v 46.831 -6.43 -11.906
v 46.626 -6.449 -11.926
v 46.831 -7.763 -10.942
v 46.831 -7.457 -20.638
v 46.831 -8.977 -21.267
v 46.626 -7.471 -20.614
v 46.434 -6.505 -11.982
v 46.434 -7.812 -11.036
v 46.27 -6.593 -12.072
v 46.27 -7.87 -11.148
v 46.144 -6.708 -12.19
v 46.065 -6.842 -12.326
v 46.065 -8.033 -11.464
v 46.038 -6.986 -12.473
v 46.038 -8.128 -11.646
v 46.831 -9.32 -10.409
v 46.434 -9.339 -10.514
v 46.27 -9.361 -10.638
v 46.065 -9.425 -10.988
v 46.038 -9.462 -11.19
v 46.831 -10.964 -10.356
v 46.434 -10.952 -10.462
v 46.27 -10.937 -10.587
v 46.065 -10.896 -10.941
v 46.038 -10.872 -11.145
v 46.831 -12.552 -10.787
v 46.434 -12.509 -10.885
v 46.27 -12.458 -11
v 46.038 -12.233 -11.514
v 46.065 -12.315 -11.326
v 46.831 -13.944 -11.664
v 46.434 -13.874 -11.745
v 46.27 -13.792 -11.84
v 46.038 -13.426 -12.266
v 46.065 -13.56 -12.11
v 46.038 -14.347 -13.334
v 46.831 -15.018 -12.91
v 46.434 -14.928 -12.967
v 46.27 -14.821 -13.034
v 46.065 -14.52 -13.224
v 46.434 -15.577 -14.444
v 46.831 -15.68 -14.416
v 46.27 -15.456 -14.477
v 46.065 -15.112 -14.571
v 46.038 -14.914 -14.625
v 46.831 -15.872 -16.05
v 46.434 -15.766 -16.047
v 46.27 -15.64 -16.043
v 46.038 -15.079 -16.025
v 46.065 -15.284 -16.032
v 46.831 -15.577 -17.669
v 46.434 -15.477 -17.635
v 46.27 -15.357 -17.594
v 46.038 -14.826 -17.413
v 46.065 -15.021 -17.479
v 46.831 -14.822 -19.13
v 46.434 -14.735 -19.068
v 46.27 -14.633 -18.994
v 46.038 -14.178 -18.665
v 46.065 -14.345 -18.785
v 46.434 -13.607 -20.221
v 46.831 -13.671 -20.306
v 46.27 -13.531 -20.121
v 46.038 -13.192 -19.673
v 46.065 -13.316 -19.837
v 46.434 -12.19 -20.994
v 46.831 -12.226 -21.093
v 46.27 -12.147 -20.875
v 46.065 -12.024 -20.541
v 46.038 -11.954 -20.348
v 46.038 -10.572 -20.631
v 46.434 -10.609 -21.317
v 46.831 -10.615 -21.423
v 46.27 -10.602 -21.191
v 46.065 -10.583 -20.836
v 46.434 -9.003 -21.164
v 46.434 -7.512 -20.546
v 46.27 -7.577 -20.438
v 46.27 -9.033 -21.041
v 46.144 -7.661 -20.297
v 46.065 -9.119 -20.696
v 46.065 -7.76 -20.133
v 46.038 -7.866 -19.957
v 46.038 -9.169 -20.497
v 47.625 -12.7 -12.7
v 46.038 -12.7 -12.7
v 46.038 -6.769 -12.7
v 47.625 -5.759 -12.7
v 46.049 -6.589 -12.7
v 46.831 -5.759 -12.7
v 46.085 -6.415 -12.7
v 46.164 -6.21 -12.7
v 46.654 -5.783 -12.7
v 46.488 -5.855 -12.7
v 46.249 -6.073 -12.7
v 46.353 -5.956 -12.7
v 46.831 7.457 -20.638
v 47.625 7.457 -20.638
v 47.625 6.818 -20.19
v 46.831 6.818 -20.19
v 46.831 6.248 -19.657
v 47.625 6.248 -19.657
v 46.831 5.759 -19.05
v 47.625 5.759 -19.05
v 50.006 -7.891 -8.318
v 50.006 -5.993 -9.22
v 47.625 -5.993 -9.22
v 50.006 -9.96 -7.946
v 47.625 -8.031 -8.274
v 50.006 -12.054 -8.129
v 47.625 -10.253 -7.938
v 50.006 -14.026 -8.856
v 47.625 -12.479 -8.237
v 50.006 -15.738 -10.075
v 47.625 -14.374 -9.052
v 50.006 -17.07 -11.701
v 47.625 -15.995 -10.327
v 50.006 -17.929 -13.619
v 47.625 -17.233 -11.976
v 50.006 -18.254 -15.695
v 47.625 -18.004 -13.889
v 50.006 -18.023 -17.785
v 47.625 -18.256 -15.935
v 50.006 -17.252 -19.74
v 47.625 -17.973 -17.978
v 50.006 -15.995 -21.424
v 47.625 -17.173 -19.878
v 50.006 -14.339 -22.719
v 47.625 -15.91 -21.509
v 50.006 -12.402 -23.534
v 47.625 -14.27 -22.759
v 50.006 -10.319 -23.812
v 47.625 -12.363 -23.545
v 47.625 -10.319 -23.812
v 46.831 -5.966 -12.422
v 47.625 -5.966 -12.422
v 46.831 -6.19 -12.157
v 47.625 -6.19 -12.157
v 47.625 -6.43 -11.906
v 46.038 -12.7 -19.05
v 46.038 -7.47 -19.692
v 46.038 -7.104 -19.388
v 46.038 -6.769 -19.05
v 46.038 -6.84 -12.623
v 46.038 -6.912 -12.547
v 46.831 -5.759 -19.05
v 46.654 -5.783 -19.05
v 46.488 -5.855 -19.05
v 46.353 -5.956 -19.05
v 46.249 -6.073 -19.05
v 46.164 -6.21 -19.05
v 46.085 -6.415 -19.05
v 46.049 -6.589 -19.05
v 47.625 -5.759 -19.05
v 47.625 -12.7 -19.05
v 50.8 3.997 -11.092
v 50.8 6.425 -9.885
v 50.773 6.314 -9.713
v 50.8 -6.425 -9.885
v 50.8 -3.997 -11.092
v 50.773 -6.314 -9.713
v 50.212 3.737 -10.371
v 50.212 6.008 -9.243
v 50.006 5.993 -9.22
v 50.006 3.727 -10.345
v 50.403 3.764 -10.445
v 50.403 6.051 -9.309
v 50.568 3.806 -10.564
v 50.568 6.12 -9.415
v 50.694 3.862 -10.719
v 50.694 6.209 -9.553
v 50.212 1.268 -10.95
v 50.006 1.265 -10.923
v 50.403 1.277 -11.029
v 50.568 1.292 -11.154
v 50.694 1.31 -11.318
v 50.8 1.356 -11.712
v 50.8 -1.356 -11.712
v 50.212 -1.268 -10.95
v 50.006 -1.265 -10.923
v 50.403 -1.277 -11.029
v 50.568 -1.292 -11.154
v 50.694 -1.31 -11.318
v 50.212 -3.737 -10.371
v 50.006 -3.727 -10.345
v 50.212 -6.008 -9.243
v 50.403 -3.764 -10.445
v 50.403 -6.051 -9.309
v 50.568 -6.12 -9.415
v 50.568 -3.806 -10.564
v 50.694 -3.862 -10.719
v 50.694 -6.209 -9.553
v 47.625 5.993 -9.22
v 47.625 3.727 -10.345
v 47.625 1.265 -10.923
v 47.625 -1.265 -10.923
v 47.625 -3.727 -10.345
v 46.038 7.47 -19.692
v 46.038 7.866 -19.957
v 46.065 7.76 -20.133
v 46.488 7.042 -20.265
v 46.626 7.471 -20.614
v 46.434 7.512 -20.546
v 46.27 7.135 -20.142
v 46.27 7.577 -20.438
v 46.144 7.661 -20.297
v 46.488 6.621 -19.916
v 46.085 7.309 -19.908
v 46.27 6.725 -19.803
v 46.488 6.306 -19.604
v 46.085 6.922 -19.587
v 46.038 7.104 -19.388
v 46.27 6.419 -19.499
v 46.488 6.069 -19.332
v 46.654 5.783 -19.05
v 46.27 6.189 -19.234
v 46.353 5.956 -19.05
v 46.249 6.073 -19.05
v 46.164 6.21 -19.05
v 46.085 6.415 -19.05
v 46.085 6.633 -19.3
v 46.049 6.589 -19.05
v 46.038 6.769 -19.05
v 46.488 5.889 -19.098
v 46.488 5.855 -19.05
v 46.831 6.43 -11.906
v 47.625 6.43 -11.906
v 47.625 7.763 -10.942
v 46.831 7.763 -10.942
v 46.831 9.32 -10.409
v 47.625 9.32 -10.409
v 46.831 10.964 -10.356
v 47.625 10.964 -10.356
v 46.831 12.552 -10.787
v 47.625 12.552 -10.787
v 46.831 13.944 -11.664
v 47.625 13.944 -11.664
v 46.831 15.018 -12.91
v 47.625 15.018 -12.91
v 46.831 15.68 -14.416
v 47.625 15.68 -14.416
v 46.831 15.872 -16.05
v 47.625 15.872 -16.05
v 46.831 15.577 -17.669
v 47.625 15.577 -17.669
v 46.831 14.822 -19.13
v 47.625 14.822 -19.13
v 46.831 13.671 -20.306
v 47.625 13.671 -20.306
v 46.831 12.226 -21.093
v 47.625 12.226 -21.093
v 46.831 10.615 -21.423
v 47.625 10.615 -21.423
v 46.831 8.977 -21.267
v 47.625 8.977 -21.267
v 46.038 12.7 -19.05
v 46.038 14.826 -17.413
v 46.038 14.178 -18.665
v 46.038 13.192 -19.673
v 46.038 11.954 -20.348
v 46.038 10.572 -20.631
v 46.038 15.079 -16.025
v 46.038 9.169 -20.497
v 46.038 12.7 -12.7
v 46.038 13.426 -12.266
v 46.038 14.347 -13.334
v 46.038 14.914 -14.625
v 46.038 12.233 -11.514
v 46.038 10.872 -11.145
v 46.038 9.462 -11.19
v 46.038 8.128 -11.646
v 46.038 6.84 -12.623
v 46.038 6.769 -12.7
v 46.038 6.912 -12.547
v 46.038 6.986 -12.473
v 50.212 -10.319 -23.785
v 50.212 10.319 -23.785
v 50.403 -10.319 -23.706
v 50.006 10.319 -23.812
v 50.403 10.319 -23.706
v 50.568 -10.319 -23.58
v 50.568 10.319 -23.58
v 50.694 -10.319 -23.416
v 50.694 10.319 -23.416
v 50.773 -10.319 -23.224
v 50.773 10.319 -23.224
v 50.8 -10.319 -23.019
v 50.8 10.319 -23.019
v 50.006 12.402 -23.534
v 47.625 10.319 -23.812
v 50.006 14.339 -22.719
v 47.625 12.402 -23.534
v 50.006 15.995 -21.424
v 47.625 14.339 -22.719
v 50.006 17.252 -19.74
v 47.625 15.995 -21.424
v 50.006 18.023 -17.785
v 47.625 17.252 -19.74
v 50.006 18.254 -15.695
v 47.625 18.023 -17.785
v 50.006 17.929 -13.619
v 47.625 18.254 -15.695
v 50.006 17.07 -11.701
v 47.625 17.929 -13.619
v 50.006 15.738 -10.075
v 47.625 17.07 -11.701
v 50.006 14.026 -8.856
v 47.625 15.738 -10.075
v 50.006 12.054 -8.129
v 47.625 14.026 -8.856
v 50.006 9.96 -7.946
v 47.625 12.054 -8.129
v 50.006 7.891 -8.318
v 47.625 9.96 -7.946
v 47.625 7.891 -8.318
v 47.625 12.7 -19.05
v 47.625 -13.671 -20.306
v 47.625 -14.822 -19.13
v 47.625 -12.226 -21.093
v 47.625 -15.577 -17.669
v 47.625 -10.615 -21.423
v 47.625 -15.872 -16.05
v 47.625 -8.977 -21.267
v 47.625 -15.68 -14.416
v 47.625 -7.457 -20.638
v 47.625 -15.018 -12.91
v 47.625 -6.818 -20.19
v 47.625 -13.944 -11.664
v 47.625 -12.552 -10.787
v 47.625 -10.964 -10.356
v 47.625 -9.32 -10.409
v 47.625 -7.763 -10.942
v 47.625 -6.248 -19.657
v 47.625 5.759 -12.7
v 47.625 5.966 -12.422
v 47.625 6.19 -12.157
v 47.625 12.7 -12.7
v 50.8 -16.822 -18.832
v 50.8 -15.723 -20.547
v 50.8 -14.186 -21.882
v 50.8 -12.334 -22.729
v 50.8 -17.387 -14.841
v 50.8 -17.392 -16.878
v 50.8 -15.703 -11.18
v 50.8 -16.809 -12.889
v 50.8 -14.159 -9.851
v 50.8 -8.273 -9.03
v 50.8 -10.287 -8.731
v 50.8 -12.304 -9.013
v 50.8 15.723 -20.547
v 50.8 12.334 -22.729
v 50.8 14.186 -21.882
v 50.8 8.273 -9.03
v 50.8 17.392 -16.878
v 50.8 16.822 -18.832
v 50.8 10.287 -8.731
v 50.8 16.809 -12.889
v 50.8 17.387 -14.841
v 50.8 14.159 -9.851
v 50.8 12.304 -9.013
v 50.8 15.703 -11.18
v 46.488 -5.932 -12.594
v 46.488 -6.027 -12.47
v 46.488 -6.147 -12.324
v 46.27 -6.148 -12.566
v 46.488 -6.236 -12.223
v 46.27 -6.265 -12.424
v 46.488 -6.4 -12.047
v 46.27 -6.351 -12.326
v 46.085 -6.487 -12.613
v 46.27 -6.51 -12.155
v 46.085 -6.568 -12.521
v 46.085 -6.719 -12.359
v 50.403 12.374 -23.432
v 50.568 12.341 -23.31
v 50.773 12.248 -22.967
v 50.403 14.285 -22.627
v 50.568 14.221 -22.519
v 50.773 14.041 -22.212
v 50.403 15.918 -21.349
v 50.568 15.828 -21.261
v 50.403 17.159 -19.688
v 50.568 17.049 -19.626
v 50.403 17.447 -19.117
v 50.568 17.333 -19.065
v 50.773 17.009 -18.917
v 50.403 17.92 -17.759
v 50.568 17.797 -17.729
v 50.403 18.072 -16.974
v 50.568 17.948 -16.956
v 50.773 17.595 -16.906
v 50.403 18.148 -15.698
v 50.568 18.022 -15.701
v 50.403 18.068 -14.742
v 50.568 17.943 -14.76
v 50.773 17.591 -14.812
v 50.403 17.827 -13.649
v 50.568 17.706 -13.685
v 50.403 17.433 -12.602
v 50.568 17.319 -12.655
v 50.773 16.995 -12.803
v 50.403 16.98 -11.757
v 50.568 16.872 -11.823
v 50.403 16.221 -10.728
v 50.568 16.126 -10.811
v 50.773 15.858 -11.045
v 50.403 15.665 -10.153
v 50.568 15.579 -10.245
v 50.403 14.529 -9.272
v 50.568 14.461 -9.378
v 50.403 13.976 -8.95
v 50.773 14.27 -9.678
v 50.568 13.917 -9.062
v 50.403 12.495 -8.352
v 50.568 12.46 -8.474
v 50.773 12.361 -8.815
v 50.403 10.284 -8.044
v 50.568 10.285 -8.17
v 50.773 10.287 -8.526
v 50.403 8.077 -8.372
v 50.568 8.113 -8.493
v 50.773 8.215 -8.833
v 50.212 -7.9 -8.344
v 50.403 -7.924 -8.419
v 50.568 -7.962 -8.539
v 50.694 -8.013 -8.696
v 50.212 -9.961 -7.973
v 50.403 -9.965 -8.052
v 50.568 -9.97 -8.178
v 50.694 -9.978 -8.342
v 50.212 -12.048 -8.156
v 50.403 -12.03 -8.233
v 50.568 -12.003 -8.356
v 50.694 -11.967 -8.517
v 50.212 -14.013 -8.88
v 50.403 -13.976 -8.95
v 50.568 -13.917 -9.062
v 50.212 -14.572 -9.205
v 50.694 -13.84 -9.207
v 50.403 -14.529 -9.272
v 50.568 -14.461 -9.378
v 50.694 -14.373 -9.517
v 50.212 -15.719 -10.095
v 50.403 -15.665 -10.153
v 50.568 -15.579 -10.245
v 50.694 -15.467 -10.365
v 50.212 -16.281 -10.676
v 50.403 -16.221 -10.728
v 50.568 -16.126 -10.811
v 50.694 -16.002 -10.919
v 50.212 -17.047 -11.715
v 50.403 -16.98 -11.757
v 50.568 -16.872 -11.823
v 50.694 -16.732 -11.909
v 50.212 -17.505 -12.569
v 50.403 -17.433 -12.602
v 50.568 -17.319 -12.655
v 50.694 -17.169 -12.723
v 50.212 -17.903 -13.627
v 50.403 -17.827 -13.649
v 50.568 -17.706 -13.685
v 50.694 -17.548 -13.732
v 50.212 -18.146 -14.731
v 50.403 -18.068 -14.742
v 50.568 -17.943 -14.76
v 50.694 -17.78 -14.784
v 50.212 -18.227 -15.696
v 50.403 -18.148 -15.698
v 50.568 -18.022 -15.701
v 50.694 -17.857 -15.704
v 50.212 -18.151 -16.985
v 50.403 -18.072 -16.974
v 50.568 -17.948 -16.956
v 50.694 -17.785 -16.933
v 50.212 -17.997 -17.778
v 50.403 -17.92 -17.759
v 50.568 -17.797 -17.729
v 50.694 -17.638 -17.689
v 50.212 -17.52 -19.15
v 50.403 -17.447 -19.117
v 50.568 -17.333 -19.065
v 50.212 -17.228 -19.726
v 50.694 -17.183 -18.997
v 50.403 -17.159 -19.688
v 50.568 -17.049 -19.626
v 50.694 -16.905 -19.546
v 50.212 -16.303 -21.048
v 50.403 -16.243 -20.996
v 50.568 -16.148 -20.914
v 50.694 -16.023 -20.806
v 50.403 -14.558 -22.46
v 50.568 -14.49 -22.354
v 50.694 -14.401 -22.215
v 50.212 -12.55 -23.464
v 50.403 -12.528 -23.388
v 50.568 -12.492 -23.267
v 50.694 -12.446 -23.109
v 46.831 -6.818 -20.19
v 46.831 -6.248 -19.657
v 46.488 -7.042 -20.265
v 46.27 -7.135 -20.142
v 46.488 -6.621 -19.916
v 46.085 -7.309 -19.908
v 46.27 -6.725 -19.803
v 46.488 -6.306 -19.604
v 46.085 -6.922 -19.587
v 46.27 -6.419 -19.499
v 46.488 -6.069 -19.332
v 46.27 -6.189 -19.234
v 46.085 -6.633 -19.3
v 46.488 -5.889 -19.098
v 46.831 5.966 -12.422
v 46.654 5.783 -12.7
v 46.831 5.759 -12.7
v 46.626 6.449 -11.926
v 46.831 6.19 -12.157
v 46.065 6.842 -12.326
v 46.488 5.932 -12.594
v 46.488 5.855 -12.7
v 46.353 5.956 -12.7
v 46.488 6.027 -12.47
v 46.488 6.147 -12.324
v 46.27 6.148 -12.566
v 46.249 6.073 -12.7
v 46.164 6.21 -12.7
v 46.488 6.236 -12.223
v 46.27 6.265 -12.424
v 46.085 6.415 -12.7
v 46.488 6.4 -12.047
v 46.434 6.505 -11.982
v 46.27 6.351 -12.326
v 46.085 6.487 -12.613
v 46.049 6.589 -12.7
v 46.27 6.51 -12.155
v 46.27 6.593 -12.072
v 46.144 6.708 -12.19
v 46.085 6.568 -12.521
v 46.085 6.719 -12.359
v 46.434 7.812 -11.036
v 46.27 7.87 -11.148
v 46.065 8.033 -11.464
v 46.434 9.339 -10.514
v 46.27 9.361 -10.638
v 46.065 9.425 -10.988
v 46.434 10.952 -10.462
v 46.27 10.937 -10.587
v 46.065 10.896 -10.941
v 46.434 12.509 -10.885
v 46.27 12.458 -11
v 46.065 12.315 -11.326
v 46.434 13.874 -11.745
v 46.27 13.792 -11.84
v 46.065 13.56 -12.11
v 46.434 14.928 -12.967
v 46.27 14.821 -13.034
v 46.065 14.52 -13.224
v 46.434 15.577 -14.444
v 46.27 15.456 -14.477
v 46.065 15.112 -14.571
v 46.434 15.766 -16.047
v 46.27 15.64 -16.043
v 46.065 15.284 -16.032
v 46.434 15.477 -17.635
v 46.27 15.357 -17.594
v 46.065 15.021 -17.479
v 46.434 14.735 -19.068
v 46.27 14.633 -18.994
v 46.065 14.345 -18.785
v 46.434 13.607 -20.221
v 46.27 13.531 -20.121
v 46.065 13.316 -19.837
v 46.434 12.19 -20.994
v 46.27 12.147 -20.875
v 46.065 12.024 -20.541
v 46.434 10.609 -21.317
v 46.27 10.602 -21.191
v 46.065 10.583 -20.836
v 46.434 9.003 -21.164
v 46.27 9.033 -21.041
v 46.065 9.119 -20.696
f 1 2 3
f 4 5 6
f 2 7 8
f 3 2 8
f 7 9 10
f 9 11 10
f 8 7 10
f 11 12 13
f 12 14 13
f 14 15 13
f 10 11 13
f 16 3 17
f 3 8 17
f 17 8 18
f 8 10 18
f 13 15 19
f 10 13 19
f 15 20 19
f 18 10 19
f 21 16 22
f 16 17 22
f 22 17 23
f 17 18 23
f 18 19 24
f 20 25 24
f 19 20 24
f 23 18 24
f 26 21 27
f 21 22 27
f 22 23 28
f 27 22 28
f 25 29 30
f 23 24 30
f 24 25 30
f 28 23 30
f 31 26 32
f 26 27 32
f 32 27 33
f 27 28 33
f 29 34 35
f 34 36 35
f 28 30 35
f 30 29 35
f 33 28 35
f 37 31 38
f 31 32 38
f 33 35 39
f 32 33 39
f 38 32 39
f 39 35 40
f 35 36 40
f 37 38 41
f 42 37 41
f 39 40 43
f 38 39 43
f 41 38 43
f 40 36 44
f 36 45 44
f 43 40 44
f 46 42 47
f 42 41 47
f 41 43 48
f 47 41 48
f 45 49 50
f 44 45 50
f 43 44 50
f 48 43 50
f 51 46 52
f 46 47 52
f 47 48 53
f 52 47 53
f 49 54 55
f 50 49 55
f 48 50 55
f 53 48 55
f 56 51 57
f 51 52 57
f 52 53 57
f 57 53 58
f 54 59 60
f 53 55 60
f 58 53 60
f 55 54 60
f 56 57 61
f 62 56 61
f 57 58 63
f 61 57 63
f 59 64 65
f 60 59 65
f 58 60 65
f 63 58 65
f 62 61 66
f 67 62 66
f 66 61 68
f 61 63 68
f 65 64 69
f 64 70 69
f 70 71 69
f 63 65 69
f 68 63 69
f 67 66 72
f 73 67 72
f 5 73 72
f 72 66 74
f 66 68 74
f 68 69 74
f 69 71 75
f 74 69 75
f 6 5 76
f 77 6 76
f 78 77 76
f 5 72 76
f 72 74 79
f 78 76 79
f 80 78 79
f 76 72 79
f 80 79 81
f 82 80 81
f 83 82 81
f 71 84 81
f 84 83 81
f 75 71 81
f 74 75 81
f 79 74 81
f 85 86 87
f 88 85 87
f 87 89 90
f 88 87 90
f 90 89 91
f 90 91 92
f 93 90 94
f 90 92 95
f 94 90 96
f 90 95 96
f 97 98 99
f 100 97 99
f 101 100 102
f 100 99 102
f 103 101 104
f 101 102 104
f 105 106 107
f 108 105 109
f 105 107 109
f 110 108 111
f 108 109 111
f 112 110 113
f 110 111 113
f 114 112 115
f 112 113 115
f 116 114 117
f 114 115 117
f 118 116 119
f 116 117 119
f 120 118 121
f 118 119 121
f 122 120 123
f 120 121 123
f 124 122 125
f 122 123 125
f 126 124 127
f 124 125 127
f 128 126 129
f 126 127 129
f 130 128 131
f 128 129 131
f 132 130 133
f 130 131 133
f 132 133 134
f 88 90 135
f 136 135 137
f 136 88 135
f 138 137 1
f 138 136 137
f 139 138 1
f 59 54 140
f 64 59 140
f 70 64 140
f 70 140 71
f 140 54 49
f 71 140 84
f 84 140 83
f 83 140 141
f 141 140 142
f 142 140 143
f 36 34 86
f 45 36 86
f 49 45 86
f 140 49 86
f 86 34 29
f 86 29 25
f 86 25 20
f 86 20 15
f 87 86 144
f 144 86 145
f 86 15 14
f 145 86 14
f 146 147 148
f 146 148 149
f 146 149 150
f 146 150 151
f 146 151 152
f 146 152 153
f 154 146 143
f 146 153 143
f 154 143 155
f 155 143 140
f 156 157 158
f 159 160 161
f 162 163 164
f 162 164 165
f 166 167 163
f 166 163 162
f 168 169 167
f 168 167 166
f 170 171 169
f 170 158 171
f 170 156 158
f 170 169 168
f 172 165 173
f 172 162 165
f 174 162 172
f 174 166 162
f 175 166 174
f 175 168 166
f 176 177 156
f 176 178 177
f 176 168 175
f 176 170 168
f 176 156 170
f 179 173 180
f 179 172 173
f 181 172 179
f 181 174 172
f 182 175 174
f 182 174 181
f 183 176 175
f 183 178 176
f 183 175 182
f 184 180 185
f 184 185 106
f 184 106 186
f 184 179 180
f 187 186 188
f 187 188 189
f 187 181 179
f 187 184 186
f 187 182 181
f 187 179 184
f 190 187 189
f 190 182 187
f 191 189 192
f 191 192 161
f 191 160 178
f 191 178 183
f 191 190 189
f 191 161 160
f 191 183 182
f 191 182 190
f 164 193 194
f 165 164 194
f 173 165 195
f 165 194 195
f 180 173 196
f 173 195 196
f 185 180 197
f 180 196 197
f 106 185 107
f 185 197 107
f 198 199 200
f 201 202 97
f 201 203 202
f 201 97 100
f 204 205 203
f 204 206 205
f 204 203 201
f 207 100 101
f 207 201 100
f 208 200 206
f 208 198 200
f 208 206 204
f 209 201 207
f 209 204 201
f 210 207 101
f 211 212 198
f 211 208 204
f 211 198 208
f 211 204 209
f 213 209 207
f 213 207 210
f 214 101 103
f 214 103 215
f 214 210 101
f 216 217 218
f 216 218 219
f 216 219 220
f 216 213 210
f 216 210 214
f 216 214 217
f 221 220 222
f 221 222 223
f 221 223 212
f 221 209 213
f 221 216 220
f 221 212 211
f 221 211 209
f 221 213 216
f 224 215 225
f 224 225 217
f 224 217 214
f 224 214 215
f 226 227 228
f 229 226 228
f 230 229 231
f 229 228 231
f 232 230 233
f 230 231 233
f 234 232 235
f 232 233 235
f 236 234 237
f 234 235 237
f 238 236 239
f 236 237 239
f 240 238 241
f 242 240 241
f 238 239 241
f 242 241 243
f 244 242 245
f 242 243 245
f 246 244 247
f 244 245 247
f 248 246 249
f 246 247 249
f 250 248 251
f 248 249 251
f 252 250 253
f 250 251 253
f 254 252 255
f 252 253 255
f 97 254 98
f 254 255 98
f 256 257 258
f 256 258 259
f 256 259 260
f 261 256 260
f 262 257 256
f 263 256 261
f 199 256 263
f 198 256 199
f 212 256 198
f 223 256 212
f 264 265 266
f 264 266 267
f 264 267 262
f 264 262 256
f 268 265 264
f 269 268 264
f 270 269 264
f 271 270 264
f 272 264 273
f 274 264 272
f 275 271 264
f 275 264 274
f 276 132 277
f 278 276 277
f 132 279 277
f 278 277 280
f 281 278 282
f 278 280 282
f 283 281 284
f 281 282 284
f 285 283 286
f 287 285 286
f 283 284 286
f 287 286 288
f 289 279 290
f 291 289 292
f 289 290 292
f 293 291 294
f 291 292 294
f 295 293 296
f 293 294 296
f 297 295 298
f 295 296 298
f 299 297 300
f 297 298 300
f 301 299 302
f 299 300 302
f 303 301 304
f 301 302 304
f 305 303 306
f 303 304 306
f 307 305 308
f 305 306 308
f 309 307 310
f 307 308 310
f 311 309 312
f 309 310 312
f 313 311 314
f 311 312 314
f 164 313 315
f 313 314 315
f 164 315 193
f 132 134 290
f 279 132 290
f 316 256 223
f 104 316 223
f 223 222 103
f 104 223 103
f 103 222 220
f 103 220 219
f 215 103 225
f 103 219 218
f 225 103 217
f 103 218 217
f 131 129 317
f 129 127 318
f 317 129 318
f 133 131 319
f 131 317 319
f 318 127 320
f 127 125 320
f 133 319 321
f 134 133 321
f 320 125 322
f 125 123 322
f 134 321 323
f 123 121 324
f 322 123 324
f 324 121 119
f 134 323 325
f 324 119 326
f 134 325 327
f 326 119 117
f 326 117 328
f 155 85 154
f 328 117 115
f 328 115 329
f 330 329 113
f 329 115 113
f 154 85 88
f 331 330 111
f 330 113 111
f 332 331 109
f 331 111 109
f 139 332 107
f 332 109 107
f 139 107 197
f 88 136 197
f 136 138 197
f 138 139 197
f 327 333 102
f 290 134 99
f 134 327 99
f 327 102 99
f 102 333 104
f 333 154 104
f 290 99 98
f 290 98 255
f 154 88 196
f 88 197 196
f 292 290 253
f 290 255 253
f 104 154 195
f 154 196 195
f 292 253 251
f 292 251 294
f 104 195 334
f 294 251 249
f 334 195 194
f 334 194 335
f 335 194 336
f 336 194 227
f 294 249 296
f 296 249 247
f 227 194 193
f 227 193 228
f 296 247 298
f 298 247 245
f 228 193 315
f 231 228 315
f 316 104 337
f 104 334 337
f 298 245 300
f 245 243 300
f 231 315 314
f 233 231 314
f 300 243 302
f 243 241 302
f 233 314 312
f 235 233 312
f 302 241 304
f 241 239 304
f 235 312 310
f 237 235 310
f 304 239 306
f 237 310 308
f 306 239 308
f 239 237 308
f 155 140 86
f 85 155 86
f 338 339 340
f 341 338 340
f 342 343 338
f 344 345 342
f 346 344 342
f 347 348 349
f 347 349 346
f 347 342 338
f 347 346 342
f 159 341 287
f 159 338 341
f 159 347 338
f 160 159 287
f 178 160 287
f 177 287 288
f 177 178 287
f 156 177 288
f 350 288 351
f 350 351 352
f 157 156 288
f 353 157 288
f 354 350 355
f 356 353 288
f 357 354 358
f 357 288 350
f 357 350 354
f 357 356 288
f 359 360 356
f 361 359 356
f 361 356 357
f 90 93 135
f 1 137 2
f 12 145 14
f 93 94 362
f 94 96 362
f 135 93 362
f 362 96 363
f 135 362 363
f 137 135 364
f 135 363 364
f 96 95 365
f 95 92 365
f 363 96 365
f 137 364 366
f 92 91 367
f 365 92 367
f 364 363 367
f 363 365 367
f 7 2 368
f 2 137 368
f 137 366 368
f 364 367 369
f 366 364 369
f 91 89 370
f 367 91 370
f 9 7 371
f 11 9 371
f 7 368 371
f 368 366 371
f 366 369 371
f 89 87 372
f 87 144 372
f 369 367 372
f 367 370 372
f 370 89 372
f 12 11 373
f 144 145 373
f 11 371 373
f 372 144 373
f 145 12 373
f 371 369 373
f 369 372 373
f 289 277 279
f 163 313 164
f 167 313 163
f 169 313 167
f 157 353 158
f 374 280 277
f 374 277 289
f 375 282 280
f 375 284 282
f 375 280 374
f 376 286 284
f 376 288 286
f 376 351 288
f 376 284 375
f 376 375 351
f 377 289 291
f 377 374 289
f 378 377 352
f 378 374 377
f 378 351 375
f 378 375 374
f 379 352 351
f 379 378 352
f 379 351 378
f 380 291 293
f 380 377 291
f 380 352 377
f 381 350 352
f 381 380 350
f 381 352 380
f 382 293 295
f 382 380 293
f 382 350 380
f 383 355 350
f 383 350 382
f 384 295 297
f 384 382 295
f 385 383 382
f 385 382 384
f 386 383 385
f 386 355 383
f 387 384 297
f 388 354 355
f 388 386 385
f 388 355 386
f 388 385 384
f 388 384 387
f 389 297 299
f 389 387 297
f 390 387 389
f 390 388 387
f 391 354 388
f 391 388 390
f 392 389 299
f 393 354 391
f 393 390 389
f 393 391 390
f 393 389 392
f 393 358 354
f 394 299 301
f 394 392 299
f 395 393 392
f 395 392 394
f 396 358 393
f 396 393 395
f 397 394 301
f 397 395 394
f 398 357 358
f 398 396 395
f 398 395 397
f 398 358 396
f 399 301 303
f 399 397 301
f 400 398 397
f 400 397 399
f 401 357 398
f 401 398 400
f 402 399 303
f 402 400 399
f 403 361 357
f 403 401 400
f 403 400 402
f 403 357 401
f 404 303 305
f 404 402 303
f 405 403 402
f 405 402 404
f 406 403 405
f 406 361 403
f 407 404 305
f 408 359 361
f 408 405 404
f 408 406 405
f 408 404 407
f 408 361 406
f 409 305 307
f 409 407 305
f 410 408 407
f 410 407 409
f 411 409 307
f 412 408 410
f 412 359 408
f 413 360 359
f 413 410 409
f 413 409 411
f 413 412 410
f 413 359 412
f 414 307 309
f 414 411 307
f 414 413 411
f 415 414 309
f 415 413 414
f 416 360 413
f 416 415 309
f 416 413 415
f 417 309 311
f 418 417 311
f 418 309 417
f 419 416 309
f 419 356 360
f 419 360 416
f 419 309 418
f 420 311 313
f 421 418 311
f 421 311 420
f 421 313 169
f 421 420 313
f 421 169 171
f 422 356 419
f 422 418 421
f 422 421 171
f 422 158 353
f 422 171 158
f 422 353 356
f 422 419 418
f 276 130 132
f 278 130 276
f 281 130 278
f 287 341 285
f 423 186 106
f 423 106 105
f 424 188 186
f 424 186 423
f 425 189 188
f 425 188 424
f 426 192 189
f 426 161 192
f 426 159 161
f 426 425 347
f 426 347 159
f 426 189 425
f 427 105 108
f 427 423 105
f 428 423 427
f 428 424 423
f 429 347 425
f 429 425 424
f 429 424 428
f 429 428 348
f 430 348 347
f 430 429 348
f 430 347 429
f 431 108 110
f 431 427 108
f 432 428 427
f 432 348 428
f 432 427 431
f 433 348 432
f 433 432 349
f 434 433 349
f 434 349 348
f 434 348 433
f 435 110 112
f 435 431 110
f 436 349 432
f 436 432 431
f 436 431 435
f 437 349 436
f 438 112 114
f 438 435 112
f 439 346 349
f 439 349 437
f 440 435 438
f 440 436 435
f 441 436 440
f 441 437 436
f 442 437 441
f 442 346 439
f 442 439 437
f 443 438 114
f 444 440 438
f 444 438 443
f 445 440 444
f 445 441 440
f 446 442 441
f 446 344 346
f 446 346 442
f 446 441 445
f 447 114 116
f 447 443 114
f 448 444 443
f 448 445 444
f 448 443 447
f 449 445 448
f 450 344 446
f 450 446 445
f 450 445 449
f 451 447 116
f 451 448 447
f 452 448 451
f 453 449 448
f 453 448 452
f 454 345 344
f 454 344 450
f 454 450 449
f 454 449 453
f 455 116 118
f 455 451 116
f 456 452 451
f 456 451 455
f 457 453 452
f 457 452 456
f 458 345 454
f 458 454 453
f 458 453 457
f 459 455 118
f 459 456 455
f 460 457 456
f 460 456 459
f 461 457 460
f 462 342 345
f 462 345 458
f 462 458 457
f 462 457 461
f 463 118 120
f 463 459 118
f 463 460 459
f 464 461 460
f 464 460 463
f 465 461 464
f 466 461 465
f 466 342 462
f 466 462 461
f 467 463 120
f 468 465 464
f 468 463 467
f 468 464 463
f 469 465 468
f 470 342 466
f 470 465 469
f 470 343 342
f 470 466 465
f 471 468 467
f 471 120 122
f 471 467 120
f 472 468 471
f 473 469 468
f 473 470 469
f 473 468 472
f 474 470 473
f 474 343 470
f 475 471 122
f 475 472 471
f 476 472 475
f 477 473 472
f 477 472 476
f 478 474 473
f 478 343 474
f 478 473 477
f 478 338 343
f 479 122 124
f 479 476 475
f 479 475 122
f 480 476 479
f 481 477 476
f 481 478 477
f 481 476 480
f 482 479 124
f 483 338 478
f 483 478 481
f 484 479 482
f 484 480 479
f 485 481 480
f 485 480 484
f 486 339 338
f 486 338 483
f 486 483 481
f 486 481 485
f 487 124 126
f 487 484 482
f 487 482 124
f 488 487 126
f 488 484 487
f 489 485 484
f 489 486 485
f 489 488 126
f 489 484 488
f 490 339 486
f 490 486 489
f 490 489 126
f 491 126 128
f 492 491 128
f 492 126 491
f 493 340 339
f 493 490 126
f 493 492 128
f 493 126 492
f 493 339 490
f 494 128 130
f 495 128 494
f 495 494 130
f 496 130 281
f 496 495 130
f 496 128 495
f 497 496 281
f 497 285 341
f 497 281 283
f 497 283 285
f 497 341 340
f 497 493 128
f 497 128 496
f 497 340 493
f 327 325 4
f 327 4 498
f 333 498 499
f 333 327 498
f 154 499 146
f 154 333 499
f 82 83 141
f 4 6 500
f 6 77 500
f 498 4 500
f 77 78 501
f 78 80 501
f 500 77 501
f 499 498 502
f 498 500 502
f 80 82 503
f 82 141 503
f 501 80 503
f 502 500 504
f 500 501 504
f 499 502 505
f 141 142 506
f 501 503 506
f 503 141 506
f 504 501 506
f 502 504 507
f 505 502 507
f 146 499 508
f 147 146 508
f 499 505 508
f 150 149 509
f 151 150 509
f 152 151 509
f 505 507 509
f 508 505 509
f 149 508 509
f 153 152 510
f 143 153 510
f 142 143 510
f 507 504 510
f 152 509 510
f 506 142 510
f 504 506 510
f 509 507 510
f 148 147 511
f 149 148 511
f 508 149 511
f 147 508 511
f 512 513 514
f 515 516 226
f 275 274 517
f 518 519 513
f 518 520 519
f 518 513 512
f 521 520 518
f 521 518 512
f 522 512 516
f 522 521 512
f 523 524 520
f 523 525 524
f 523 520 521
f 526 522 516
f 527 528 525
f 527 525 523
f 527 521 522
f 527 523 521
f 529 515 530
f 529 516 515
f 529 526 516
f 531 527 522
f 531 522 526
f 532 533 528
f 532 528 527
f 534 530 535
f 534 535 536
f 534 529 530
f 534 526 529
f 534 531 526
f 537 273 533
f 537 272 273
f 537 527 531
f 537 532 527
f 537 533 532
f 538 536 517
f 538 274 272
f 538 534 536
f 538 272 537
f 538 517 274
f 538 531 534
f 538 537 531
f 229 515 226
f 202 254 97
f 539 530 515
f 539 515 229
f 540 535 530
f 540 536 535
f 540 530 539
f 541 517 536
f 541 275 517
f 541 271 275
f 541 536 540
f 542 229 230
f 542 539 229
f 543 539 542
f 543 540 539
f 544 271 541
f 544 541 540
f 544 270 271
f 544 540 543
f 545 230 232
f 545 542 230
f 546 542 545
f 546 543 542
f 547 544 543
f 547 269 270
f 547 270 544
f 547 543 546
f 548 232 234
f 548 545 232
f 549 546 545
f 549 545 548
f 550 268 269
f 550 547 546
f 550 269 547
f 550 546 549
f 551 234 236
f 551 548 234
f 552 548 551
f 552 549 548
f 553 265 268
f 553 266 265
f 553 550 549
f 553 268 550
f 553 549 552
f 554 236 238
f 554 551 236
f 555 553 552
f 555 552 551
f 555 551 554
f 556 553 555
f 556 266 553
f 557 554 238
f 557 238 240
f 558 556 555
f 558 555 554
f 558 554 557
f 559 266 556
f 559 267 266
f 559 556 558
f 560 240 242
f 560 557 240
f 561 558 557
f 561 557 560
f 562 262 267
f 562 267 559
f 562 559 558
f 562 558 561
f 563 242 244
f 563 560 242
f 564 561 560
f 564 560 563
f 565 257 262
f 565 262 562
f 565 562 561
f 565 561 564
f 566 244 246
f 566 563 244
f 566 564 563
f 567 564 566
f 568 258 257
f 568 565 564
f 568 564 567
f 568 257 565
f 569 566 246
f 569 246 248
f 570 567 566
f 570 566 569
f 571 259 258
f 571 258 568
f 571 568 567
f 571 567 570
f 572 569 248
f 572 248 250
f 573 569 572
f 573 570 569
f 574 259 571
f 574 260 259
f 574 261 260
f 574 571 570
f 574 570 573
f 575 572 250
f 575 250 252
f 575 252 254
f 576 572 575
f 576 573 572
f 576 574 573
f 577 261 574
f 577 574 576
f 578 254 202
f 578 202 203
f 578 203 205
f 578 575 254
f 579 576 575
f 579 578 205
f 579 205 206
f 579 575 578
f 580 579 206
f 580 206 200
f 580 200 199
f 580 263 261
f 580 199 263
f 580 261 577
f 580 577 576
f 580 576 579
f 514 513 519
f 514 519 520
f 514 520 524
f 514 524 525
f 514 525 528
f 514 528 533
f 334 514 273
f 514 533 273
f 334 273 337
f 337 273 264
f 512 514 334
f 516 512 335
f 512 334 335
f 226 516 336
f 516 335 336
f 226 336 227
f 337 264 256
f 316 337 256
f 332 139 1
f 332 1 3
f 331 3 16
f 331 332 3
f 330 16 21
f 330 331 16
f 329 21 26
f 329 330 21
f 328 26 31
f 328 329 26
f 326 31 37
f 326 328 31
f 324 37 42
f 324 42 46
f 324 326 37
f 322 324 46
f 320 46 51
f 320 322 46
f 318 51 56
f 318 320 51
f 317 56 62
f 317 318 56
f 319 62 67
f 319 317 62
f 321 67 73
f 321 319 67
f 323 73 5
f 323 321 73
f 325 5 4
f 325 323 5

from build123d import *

# Parameters (mm, degrees)
F0_R           = 5.55625
F1_DEPTH       = 47.625
F0_R_2         = 6.5484375
F2_DEPTH       = 19.05
F4_DEPTH       = 28.575
F5_W           = 8.73125
F5_H           = 8.73125
F6_DEPTH       = 47.626
F7_R           = 4.365625
F8_DEPTH       = 9.525
F8_DEPTH_BACK  = 9.525
F10_DEPTH      = 9.525
F12_D          = 2.7051
F12_DEPTH      = 15.875
F12_TIP        = 0.8126940303
F14_DEPTH      = 3.175
F15_W          = 60.325
F15_H          = 50.8
F16_DEPTH      = 25.4
F16_DEPTH_BACK = 8.73225
F18_DEPTH      = 1.5875
F19_R          = 0.79375
F21_DEPTH      = 1.5875
F22_R          = 0.79375


# Not quite as in the source:
# - a pattern or mirror of a feature is missing from the dataset's text; its kind, count and spacing are read off the source's solid
# - a feature names something its author has since deleted; it is built from what else it names


with BuildPart() as f1:
    # F0 (on Right) → F1 (new body)
    with BuildSketch(Plane.YZ):
        with BuildLine():
            ThreePointArc((18.25625, -15.875), (16.6494169978, -11.0868310793), (12.4794785699, -8.2372543707))
            ThreePointArc((12.4794785699, -8.2372543707), (2.4565457231, -14.7842891497), (10.31875, -23.8125))
            ThreePointArc((10.31875, -23.8125), (15.9314100757, -21.4876600757), (18.25625, -15.875))
        make_face()
        with Locations((10.31875, -15.875)):
            Circle(F0_R, mode=Mode.SUBTRACT)
    extrude(amount=F1_DEPTH)



with BuildPart() as f1b:
    # F0 (on Right) → F1, piece 2 (new body)
    with BuildSketch(Plane.YZ):
        with BuildLine():
            ThreePointArc((-2.38125, -15.875), (-5.5305810793, -9.5443330022), (-12.4794785699, -8.2372543707))
            ThreePointArc((-12.4794785699, -8.2372543707), (-18.1809542769, -16.9657108503), (-10.31875, -23.8125))
            ThreePointArc((-10.31875, -23.8125), (-4.7060899243, -21.4876600757), (-2.38125, -15.875))
        make_face()
        with Locations((-10.31875, -15.875)):
            Circle(F0_R, mode=Mode.SUBTRACT)
    extrude(amount=F1_DEPTH)


with BuildPart() as f1_1:
    add(f1.part)

    add(f1b.part)  # F2 merges F1b
    # F0 (on Right) → F2 (join)
    with BuildSketch(Plane.YZ):
        with BuildLine():
            ThreePointArc((8.5506596809, -1.7666198185), (8.6859850881, -0.8879130653), (8.73125, 0))
            ThreePointArc((8.73125, 0), (-0.8879130653, 8.6859850881), (-8.5506596809, -1.7666198185))
            ThreePointArc((-8.5506596809, -1.7666198185), (0, -8.73125), (8.5506596809, -1.7666198185))
        make_face()
        Circle(F0_R_2, mode=Mode.SUBTRACT)
        with BuildLine():
            ThreePointArc((8.5506596809, -1.7666198185), (0, -8.73125), (-8.5506596809, -1.7666198185))
            ThreePointArc((-8.5506596809, -1.7666198185), (-9.2426468573, -5.7745223181), (-12.4794785699, -8.2372543707))
            ThreePointArc((-12.4794785699, -8.2372543707), (-5.5305810793, -9.5443330022), (-2.38125, -15.875))
            ThreePointArc((-2.38125, -15.875), (-4.7060899243, -21.4876600757), (-10.31875, -23.8125))
            Line((-10.31875, -23.8125), (10.31875, -23.8125))
            ThreePointArc((10.31875, -23.8125), (2.4565457231, -14.7842891497), (12.4794785699, -8.2372543707))
            ThreePointArc((12.4794785699, -8.2372543707), (9.2426468573, -5.7745223181), (8.5506596809, -1.7666198185))
        make_face()
    extrude(amount=F2_DEPTH)

    # F3 (on face) → F4 (join, through all)
    with BuildSketch(Plane.YZ.offset(47.625)):
        with BuildLine():
            ThreePointArc((5.9929049671, -9.2198537956), (0, -10.9963909515), (-5.9929049671, -9.2198537956))
            ThreePointArc((-5.9929049671, -9.2198537956), (-3.3423504559, -12.0890053287), (-2.38125, -15.875))
            ThreePointArc((-2.38125, -15.875), (-4.7060899243, -21.4876600757), (-10.31875, -23.8125))
            Line((-10.31875, -23.8125), (10.31875, -23.8125))
            ThreePointArc((10.31875, -23.8125), (2.7085880685, -18.1309569203), (5.9929049671, -9.2198537956))
        make_face()
    extrude(amount=-F4_DEPTH)

    # F5 (on face) → F6 (cut, through all)
    with BuildSketch(Plane(origin=(0, 0, 0), x_dir=(0, -1, 0), z_dir=(-1, 0, 0))):
        with Locations((0, -16.271875)):
            Rectangle(F5_W, F5_H)
    extrude(amount=-F6_DEPTH, mode=Mode.SUBTRACT)

    # F7 (on Front) → F8 (cut, two sides)
    with BuildSketch(Plane.XZ) as f8_sk:
        with Locations((0, -16.271875)):
            Circle(F7_R)
        with Locations((47.625, -16.271875)):
            Circle(F7_R)
    extrude(amount=-F8_DEPTH, mode=Mode.SUBTRACT)
    extrude(f8_sk.sketch, amount=F8_DEPTH_BACK, mode=Mode.SUBTRACT)

    # F9 (on face) → F10 (cut)
    with BuildSketch(Plane(origin=(0, 0, -11.90625), x_dir=(1, 0, 0), z_dir=(0, 0, -1))):
        with BuildLine():
            ThreePointArc((0, -4.3352987234), (2.7498472571, -2.8996680512), (3.8519455094, 0))
            ThreePointArc((3.8519455094, 0), (2.7498472571, 2.8996680512), (0, 4.3352987234))
            Line((0, 4.3352987234), (0, -4.3352987234))
        make_face()
        with BuildLine():
            Line((0, -4.3352987234), (0, 4.3352987234))
            ThreePointArc((0, 4.3352987234), (-4.8793044906, 0), (0, -4.3352987234))
        make_face()
    extrude(amount=-F10_DEPTH, mode=Mode.SUBTRACT)

    # F12
    with Locations(Plane(origin=(0, 0, 0), x_dir=(0, -1, 0), z_dir=(-1, 0, 0))):
        with Locations((7.14375, -7.9375), (-7.14375, -7.9375)):
            Hole(F12_D / 2, depth=F12_DEPTH)
            with Locations((0, 0, -(F12_DEPTH + F12_TIP / 2))):  # 118° drill point
                Cone(0, F12_D / 2, F12_TIP, mode=Mode.SUBTRACT)

    # F13 (on face) → F14 (join)
    with BuildSketch(Plane.YZ.offset(47.625)):
        with BuildLine():
            ThreePointArc((5.9929049671, -9.2198537956), (0, -10.9963909515), (-5.9929049671, -9.2198537956))
            ThreePointArc((-5.9929049671, -9.2198537956), (-17.9289119315, -13.6190430797), (-10.31875, -23.8125))
            Line((-10.31875, -23.8125), (10.31875, -23.8125))
            ThreePointArc((10.31875, -23.8125), (17.9289119315, -13.6190430797), (5.9929049671, -9.2198537956))
        make_face()
        with BuildLine():
            ThreePointArc((-7.4568436751, -20.6375), (-15.8369831688, -15.2261419591), (-6.4301850333, -11.90625))
            Line((-6.4301850333, -11.90625), (-4.365625, -11.90625))
            Line((-4.365625, -11.90625), (4.365625, -11.90625))
            Line((4.365625, -11.90625), (6.4301850333, -11.90625))
            ThreePointArc((6.4301850333, -11.90625), (12.4711991825, -10.7526102668), (15.875, -15.875))
            ThreePointArc((15.875, -15.875), (13.054663654, -20.7109787572), (7.4568436751, -20.6375))
            Line((7.4568436751, -20.6375), (4.365625, -20.6375))
            Line((4.365625, -20.6375), (-4.365625, -20.6375))
            Line((-4.365625, -20.6375), (-7.4568436751, -20.6375))
        make_face(mode=Mode.SUBTRACT)
        with BuildLine():
            Line((-4.365625, -11.90625), (-6.4301850333, -11.90625))
            ThreePointArc((-6.4301850333, -11.90625), (-15.8369831688, -15.2261419591), (-7.4568436751, -20.6375))
            Line((-7.4568436751, -20.6375), (-4.365625, -20.6375))
            Line((-4.365625, -20.6375), (4.365625, -20.6375))
            Line((4.365625, -20.6375), (7.4568436751, -20.6375))
            ThreePointArc((7.4568436751, -20.6375), (13.054663654, -20.7109787572), (15.875, -15.875))
            ThreePointArc((15.875, -15.875), (12.4711991825, -10.7526102668), (6.4301850333, -11.90625))
            Line((6.4301850333, -11.90625), (4.365625, -11.90625))
            Line((4.365625, -11.90625), (-4.365625, -11.90625))
        make_face()
    extrude(amount=F14_DEPTH)

    # F15 (on Top) → F16 (cut, two sides)
    with BuildSketch(Plane.XY) as f16_sk:
        with Locations((17.4625, 0)):
            Rectangle(F15_W, F15_H)
    extrude(amount=-F16_DEPTH, mode=Mode.SUBTRACT)
    extrude(f16_sk.sketch, amount=F16_DEPTH_BACK, mode=Mode.SUBTRACT)

    # F17 (on face) → F18 (join)
    with BuildSketch(Plane.YZ.offset(47.625)):
        with BuildLine():
            ThreePointArc((-7.4568436751, -20.6375), (-5.4827712428, -18.610913654), (-4.7625, -15.875))
            ThreePointArc((-4.7625, -15.875), (-5.1963602668, -13.7225508175), (-6.4301850333, -11.90625))
            ThreePointArc((-6.4301850333, -11.90625), (-15.8369831688, -15.2261419591), (-7.4568436751, -20.6375))
        make_face()
    f18 = extrude(amount=-F18_DEPTH)

    # F18_copies: F18 across plane
    add(f18.mirror(Plane.ZX))

    # F19
    f19_edges = [f1_1.edges().sort_by_distance(p)[0] for p in [
        (46.0375, 13.180656, -11.1125),
        (46.0375, -13.180656, -11.1125),
    ]]
    fillet(f19_edges, radius=F19_R)

    # F20 (on face) → F21 (cut)
    with BuildSketch(Plane(origin=(46.0375, 0, 0), x_dir=(0, -1, 0), z_dir=(-1, 0, 0))):
        with BuildLine():
            Line((6.7689920857, -12.7), (-12.7, -12.7))
            Line((-12.7, -12.7), (-12.7, -19.05))
            Line((-12.7, -19.05), (6.7689920857, -19.05))
            ThreePointArc((6.7689920857, -19.05), (5.55625, -15.875), (6.7689920857, -12.7))
        make_face()
        with BuildLine():
            Line((12.7, -12.7), (6.7689920857, -12.7))
            ThreePointArc((6.7689920857, -12.7), (5.55625, -15.875), (6.7689920857, -19.05))
            Line((6.7689920857, -19.05), (12.7, -19.05))
            Line((12.7, -19.05), (12.7, -12.7))
        make_face()
    extrude(amount=-F21_DEPTH, mode=Mode.SUBTRACT)

    # F22
    f22_edges = [f1_1.edges().sort_by_distance(p)[0] for p in [
        (50.8, 17.928912, -13.619043),
        (50.8, 0, -10.996391),
        (50.8, -17.928912, -13.619043),
        (50.8, 0, -23.8125),
    ]]
    fillet(f22_edges, radius=F22_R)


solid = f1_1.part
